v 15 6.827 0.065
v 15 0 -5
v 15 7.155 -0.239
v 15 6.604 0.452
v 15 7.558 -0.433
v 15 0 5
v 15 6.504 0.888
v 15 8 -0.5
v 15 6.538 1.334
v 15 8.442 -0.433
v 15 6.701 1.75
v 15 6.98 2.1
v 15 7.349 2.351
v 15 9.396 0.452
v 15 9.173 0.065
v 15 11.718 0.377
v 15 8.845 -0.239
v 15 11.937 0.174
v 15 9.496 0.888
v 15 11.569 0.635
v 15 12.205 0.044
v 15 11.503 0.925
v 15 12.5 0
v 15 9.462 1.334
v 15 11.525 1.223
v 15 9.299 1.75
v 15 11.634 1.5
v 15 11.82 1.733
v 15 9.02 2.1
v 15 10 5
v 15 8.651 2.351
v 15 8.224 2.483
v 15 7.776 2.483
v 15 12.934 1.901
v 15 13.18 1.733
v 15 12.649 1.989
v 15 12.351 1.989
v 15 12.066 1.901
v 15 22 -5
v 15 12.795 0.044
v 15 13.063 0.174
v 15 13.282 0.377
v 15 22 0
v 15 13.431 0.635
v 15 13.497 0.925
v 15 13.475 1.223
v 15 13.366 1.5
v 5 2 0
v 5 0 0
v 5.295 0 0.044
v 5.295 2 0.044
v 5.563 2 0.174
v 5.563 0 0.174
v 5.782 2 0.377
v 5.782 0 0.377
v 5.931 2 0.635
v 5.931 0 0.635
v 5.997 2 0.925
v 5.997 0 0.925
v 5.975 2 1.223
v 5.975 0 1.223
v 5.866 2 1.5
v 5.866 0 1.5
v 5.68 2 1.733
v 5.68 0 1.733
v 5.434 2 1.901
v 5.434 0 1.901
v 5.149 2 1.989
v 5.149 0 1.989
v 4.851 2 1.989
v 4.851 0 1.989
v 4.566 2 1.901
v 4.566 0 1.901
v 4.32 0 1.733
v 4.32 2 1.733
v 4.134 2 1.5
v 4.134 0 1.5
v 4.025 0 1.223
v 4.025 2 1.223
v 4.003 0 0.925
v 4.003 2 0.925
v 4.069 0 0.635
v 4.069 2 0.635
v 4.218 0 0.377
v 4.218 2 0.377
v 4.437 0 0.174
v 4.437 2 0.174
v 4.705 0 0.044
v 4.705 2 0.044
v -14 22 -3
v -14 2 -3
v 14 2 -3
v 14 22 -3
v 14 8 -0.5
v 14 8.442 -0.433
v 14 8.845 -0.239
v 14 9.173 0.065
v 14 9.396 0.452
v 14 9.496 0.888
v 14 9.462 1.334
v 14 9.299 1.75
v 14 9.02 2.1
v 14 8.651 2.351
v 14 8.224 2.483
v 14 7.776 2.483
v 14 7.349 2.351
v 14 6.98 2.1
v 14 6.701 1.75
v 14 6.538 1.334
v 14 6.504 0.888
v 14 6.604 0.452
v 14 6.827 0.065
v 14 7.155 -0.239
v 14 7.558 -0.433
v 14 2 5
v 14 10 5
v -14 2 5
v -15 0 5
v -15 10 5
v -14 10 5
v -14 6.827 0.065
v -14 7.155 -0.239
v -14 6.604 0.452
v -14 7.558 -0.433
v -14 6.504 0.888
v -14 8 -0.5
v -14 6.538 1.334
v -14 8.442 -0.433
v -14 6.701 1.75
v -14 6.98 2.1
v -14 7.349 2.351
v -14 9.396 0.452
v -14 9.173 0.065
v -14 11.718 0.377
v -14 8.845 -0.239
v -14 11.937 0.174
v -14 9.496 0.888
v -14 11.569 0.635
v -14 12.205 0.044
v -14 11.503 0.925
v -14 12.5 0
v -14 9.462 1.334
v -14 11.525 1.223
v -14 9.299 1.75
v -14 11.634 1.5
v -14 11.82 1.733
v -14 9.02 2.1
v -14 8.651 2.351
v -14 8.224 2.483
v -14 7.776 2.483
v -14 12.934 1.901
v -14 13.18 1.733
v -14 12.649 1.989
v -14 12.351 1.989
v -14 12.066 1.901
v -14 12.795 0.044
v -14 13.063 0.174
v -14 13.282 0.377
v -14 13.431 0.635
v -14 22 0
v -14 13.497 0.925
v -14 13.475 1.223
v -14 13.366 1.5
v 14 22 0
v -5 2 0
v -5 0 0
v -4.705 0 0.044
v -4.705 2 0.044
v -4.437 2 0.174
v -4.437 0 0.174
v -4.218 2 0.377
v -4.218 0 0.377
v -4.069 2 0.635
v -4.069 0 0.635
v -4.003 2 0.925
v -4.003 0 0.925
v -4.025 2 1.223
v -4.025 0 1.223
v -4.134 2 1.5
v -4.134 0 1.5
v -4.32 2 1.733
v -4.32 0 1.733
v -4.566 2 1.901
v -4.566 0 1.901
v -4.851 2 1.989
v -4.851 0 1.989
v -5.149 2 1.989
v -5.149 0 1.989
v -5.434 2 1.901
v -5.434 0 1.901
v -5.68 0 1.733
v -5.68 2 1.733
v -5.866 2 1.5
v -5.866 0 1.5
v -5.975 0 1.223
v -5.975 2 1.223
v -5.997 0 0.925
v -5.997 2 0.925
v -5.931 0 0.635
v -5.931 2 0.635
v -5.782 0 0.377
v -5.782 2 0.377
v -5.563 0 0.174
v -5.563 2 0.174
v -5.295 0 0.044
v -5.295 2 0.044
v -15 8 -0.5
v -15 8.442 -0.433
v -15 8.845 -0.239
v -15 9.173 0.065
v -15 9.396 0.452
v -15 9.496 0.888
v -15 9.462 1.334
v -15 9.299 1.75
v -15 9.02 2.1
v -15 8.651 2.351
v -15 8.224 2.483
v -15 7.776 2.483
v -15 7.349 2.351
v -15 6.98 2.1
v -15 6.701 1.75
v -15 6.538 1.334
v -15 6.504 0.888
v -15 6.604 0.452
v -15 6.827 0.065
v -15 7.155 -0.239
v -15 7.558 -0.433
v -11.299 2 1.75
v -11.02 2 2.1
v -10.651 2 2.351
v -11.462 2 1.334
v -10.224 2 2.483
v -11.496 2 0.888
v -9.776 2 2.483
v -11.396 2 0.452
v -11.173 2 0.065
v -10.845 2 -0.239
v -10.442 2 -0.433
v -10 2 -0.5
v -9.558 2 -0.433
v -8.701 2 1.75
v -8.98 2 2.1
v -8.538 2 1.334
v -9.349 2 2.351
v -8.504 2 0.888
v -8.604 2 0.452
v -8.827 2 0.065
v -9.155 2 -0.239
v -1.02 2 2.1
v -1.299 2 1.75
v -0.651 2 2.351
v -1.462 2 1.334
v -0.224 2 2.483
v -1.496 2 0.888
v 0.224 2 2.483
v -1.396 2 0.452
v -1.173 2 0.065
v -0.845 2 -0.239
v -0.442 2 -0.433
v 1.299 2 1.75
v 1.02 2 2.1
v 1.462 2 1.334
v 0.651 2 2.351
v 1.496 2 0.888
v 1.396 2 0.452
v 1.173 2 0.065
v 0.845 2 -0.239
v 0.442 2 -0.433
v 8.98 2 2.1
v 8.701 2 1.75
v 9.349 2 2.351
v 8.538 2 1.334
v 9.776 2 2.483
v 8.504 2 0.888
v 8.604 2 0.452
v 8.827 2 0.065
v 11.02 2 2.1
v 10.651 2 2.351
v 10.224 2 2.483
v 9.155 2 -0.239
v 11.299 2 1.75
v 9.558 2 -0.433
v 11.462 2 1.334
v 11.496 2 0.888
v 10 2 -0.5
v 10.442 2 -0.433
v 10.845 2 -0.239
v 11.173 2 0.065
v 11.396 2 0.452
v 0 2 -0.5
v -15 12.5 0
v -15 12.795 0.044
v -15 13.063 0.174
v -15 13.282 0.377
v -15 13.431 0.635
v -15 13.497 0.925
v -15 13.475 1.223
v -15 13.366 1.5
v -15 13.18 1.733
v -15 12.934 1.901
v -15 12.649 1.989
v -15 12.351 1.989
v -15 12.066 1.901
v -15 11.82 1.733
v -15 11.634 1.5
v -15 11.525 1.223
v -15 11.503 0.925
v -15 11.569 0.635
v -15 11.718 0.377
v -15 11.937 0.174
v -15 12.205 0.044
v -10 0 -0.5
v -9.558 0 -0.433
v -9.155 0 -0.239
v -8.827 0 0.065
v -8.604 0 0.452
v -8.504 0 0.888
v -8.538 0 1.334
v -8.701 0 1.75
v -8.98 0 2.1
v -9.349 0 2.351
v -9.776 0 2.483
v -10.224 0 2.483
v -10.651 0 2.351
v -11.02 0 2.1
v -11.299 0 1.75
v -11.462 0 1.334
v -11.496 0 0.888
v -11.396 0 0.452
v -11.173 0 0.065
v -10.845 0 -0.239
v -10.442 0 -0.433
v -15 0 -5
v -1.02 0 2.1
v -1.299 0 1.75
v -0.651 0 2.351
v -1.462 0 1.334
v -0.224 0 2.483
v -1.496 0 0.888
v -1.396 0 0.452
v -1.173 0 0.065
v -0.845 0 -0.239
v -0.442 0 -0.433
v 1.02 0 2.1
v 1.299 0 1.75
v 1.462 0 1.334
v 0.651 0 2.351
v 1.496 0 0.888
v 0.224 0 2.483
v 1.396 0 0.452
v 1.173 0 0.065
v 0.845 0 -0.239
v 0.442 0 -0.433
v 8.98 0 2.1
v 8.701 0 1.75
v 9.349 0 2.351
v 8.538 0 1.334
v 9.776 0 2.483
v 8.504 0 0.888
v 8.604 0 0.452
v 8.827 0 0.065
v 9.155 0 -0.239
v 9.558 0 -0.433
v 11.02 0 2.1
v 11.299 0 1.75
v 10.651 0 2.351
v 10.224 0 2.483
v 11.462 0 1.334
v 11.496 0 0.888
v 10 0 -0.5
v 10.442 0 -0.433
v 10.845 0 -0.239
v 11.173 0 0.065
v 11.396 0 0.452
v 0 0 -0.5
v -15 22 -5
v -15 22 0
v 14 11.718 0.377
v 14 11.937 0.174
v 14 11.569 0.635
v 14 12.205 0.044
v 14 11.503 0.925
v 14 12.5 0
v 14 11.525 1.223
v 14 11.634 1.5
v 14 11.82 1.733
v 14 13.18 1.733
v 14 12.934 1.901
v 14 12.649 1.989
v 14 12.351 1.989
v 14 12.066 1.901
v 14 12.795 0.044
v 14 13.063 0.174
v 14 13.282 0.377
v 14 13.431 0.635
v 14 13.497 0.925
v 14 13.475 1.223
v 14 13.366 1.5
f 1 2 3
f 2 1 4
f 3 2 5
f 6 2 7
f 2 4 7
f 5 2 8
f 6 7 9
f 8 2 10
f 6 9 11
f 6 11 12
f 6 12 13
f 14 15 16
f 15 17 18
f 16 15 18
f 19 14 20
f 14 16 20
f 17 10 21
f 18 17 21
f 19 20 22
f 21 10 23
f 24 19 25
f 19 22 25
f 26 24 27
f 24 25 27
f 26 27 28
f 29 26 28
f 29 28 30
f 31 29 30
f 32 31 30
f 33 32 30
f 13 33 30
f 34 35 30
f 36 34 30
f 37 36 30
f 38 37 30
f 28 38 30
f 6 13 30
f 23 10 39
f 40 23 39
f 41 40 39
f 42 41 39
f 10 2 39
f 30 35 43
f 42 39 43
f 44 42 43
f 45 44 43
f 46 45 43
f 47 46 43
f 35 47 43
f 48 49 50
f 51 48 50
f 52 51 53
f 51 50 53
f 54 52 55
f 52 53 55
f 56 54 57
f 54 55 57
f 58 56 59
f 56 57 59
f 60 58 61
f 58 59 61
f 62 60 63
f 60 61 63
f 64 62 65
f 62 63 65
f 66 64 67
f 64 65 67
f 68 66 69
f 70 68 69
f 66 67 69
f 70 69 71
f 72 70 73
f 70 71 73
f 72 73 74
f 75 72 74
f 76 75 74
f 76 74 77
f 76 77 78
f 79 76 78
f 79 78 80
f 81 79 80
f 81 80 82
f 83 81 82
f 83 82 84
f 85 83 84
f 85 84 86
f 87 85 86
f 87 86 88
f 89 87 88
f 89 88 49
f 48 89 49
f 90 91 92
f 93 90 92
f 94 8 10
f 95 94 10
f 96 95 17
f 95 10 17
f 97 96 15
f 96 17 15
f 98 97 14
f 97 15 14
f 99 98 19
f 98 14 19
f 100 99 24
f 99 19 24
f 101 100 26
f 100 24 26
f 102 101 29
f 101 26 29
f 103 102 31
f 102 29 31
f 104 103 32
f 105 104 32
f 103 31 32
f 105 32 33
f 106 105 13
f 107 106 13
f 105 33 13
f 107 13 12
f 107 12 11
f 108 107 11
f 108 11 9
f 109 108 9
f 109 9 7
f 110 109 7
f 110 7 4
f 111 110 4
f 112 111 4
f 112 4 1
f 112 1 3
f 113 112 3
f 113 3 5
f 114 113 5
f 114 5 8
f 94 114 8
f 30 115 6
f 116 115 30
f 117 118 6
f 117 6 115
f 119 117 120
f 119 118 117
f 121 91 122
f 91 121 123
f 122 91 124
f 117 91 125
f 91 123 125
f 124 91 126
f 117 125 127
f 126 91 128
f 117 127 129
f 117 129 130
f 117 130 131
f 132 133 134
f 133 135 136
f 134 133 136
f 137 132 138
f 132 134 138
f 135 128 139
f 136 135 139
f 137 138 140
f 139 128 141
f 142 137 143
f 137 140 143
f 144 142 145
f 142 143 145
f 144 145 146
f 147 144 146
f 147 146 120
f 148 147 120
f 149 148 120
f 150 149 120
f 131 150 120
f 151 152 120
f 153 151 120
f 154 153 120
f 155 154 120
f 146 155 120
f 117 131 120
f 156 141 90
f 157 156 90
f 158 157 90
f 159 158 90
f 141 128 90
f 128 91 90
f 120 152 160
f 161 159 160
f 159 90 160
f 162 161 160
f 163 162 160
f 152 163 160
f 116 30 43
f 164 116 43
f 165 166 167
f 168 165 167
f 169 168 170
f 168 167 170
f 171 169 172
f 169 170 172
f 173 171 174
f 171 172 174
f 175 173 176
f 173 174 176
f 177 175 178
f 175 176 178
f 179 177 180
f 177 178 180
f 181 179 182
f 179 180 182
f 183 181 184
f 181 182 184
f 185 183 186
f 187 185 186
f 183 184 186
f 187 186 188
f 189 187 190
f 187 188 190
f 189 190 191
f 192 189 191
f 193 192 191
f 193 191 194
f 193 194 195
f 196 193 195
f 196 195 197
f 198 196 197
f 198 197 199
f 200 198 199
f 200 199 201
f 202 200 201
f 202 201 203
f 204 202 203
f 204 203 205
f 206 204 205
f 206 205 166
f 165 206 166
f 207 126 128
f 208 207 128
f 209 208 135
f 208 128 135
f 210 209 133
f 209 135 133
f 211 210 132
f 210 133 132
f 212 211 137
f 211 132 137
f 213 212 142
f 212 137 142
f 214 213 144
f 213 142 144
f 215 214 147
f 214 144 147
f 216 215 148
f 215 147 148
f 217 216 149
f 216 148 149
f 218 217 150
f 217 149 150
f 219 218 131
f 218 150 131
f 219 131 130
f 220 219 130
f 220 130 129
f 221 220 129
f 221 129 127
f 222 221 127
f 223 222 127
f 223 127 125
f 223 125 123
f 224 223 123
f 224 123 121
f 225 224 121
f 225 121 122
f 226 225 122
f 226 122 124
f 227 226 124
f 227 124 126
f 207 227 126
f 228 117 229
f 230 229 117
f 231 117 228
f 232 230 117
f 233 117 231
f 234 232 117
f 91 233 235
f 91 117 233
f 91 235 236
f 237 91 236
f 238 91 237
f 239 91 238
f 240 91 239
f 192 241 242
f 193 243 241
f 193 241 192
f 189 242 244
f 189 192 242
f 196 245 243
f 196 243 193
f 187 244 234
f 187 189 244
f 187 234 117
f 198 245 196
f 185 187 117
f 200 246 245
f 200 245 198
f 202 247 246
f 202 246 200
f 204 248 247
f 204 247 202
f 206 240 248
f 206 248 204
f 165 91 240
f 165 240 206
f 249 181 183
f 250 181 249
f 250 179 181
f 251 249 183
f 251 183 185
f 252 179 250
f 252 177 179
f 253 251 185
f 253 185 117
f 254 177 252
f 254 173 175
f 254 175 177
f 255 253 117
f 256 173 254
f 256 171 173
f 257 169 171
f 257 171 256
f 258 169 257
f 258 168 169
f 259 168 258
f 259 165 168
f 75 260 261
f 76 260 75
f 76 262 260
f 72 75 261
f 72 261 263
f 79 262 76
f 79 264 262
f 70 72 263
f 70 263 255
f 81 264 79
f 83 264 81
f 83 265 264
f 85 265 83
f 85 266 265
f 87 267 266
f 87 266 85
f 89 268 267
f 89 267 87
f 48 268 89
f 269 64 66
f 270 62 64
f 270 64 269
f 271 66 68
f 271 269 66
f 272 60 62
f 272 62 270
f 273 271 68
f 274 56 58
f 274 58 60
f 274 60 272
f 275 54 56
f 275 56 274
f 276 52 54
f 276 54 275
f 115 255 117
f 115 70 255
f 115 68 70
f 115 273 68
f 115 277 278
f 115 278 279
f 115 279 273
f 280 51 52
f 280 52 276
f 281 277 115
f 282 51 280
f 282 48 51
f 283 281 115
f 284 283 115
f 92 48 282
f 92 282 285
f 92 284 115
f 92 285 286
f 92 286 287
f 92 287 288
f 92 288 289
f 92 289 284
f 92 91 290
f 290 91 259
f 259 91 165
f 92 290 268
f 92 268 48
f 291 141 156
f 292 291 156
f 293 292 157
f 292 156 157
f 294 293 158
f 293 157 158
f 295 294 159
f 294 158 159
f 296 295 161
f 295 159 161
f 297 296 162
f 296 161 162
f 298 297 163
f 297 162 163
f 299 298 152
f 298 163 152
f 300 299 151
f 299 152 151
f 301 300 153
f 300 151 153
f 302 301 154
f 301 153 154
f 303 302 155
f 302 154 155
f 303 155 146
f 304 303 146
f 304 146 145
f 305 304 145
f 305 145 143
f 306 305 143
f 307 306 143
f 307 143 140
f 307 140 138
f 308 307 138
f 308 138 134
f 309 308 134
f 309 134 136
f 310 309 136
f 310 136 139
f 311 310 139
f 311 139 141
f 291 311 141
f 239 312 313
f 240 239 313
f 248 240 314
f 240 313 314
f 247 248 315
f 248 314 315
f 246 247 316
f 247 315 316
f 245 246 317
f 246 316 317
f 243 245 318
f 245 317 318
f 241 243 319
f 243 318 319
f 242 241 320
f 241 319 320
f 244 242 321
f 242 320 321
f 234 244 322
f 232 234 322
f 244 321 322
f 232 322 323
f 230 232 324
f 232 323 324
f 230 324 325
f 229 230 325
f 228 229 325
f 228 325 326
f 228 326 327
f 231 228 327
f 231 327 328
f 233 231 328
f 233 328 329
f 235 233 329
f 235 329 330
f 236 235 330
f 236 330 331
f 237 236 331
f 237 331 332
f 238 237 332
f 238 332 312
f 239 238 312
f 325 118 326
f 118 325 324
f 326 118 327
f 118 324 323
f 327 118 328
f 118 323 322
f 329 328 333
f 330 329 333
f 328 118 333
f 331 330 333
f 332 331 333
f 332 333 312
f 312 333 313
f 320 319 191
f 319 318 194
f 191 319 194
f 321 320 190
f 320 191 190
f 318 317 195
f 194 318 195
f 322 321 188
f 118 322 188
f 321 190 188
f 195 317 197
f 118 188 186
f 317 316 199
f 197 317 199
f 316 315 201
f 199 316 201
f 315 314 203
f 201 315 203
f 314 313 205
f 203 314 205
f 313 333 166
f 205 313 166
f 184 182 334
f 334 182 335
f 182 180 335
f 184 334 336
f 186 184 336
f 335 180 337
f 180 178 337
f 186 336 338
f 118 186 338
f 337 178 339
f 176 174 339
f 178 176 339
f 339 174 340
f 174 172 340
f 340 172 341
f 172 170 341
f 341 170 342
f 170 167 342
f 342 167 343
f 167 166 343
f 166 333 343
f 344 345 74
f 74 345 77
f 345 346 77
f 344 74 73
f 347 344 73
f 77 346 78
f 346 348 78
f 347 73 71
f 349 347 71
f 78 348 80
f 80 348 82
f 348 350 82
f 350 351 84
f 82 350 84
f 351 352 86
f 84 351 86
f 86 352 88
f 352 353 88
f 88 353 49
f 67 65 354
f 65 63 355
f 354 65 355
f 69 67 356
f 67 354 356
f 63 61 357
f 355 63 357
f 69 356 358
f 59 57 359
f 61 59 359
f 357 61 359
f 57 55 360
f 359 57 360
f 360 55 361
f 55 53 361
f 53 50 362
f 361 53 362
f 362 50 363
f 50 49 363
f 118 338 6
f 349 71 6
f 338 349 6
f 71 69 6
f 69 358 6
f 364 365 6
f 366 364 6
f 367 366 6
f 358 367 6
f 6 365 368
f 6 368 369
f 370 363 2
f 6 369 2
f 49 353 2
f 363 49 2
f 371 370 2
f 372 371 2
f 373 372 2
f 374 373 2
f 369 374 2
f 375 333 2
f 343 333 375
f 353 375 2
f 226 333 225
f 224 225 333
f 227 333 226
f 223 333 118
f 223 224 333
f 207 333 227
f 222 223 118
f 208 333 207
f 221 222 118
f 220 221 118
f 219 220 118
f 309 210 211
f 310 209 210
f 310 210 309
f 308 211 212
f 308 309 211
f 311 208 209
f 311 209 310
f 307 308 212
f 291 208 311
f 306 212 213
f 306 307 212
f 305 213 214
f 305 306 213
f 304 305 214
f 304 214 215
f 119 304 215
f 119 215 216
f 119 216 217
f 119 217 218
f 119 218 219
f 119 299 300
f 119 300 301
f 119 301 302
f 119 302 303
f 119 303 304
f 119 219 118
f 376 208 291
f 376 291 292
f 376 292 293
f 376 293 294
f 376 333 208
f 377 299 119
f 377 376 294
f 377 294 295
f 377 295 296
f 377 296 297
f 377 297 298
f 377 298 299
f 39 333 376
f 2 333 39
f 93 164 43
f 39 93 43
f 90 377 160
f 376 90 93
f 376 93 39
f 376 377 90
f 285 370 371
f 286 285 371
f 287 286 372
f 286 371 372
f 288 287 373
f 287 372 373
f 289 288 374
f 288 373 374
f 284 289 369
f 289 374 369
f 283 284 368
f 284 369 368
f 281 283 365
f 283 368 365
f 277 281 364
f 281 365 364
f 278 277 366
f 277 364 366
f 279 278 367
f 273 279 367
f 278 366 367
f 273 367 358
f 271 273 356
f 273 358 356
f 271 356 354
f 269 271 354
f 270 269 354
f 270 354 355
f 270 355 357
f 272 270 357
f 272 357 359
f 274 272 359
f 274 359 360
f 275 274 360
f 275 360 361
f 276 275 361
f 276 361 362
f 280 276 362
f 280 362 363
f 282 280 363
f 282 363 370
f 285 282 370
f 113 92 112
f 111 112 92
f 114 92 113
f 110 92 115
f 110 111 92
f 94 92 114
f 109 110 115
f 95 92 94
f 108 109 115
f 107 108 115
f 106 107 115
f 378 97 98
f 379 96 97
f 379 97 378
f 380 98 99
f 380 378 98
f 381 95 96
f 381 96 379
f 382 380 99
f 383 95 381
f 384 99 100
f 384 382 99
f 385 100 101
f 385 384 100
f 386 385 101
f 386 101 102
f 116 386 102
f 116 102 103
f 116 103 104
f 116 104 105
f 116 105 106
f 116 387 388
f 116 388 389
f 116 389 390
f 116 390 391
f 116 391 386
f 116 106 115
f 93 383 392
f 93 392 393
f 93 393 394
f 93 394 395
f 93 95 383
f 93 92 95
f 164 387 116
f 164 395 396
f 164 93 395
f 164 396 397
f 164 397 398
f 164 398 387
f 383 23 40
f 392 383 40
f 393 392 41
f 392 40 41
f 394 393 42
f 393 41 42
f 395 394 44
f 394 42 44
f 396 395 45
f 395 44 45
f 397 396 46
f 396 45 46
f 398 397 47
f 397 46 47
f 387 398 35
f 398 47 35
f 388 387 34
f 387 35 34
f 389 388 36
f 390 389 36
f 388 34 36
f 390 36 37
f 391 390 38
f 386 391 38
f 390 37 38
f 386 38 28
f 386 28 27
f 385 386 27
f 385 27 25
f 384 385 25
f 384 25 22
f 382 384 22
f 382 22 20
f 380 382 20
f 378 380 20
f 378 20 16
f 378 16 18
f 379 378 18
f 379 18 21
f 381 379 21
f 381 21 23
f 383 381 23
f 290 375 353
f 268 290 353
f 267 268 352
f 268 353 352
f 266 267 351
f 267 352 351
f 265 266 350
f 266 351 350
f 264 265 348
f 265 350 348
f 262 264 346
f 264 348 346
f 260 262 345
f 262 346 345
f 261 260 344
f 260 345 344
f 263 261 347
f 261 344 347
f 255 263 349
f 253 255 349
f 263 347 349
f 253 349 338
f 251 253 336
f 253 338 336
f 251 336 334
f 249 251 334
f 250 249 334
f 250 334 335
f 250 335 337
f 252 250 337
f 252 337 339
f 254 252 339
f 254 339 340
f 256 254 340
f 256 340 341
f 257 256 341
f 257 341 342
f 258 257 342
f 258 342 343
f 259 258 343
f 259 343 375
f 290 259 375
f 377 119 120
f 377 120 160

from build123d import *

# Parameters (mm, degrees)
SKETCH1_W           = 30
SKETCH1_H           = 10
BOSS_EXTRUDE1_DEPTH = 2
SKETCH2_W           = 30
SKETCH2_H           = 2
BOSS_EXTRUDE2_DEPTH = 20
BOSS_EXTRUDE3_DEPTH = 1
BOSS_EXTRUDE4_START = -30
BOSS_EXTRUDE4_DEPTH = 1
SKETCH4_R           = 1.5
SKETCH4_R_2         = 1
CUT_EXTRUDE1_DEPTH  = 11
SKETCH5_R           = 1.5
SKETCH5_R_2         = 1
CUT_EXTRUDE2_DEPTH  = 41


with BuildPart() as part:
    # Sketch1 → Boss-Extrude1 (new body)
    with BuildSketch(Plane(origin=(0, 0, 0), x_dir=(1, 0, 0), z_dir=(0, 1, 0))):
        Rectangle(SKETCH1_W, SKETCH1_H)
    extrude(amount=BOSS_EXTRUDE1_DEPTH)

    # Sketch2 → Boss-Extrude2 (add)
    with BuildSketch(Plane(origin=(0, 2, 0), x_dir=(1, 0, 0), z_dir=(0, 1, 0))):
        with Locations((0, 4)):
            Rectangle(SKETCH2_W, SKETCH2_H)
    extrude(amount=BOSS_EXTRUDE2_DEPTH)

    # Sketch3 → Boss-Extrude3 (add)
    with BuildSketch(Plane(origin=(15, 0, 0), x_dir=(0, 0, -1), z_dir=(1, 0, 0))):
        Polygon((-5, 2), (-5, 10), (0, 22), (3, 22), (3, 2), align=None)
    extrude(amount=-BOSS_EXTRUDE3_DEPTH)

    # Sketch3<2> → Boss-Extrude4 (add)
    with BuildSketch(Plane(origin=(15, 0, 0), x_dir=(0, 0, -1), z_dir=(1, 0, 0)).offset(BOSS_EXTRUDE4_START)):
        Polygon((-5, 2), (-5, 10), (0, 22), (3, 22), (3, 2), align=None)
    extrude(amount=BOSS_EXTRUDE4_DEPTH)

    # Sketch4 → Cut-Extrude1 (cut)
    with BuildSketch(Plane.XZ):
        with Locations(Location((0, 1, 0), (0, 0, 270))):
            Circle(SKETCH4_R)
        with Locations(Location((5, 1, 0), (0, 0, 270))):
            Circle(SKETCH4_R_2)
        with Locations(Location((-5, 1, 0), (0, 0, 270))):
            Circle(SKETCH4_R_2)
        with Locations(Location((10, 1, 0), (0, 0, 270))):
            Circle(SKETCH4_R)
        with Locations(Location((-10, 1, 0), (0, 0, 270))):
            Circle(SKETCH4_R)
    extrude(amount=-CUT_EXTRUDE1_DEPTH, mode=Mode.SUBTRACT)

    # Sketch5 → Cut-Extrude2 (cut)
    with BuildSketch(Plane(origin=(15, 0, 0), x_dir=(0, 0, -1), z_dir=(1, 0, 0))):
        with Locations((-1, 8)):
            Circle(SKETCH5_R)
        with Locations((-1, 12.5)):
            Circle(SKETCH5_R_2)
    extrude(amount=-CUT_EXTRUDE2_DEPTH, mode=Mode.SUBTRACT)


solid = part.part
